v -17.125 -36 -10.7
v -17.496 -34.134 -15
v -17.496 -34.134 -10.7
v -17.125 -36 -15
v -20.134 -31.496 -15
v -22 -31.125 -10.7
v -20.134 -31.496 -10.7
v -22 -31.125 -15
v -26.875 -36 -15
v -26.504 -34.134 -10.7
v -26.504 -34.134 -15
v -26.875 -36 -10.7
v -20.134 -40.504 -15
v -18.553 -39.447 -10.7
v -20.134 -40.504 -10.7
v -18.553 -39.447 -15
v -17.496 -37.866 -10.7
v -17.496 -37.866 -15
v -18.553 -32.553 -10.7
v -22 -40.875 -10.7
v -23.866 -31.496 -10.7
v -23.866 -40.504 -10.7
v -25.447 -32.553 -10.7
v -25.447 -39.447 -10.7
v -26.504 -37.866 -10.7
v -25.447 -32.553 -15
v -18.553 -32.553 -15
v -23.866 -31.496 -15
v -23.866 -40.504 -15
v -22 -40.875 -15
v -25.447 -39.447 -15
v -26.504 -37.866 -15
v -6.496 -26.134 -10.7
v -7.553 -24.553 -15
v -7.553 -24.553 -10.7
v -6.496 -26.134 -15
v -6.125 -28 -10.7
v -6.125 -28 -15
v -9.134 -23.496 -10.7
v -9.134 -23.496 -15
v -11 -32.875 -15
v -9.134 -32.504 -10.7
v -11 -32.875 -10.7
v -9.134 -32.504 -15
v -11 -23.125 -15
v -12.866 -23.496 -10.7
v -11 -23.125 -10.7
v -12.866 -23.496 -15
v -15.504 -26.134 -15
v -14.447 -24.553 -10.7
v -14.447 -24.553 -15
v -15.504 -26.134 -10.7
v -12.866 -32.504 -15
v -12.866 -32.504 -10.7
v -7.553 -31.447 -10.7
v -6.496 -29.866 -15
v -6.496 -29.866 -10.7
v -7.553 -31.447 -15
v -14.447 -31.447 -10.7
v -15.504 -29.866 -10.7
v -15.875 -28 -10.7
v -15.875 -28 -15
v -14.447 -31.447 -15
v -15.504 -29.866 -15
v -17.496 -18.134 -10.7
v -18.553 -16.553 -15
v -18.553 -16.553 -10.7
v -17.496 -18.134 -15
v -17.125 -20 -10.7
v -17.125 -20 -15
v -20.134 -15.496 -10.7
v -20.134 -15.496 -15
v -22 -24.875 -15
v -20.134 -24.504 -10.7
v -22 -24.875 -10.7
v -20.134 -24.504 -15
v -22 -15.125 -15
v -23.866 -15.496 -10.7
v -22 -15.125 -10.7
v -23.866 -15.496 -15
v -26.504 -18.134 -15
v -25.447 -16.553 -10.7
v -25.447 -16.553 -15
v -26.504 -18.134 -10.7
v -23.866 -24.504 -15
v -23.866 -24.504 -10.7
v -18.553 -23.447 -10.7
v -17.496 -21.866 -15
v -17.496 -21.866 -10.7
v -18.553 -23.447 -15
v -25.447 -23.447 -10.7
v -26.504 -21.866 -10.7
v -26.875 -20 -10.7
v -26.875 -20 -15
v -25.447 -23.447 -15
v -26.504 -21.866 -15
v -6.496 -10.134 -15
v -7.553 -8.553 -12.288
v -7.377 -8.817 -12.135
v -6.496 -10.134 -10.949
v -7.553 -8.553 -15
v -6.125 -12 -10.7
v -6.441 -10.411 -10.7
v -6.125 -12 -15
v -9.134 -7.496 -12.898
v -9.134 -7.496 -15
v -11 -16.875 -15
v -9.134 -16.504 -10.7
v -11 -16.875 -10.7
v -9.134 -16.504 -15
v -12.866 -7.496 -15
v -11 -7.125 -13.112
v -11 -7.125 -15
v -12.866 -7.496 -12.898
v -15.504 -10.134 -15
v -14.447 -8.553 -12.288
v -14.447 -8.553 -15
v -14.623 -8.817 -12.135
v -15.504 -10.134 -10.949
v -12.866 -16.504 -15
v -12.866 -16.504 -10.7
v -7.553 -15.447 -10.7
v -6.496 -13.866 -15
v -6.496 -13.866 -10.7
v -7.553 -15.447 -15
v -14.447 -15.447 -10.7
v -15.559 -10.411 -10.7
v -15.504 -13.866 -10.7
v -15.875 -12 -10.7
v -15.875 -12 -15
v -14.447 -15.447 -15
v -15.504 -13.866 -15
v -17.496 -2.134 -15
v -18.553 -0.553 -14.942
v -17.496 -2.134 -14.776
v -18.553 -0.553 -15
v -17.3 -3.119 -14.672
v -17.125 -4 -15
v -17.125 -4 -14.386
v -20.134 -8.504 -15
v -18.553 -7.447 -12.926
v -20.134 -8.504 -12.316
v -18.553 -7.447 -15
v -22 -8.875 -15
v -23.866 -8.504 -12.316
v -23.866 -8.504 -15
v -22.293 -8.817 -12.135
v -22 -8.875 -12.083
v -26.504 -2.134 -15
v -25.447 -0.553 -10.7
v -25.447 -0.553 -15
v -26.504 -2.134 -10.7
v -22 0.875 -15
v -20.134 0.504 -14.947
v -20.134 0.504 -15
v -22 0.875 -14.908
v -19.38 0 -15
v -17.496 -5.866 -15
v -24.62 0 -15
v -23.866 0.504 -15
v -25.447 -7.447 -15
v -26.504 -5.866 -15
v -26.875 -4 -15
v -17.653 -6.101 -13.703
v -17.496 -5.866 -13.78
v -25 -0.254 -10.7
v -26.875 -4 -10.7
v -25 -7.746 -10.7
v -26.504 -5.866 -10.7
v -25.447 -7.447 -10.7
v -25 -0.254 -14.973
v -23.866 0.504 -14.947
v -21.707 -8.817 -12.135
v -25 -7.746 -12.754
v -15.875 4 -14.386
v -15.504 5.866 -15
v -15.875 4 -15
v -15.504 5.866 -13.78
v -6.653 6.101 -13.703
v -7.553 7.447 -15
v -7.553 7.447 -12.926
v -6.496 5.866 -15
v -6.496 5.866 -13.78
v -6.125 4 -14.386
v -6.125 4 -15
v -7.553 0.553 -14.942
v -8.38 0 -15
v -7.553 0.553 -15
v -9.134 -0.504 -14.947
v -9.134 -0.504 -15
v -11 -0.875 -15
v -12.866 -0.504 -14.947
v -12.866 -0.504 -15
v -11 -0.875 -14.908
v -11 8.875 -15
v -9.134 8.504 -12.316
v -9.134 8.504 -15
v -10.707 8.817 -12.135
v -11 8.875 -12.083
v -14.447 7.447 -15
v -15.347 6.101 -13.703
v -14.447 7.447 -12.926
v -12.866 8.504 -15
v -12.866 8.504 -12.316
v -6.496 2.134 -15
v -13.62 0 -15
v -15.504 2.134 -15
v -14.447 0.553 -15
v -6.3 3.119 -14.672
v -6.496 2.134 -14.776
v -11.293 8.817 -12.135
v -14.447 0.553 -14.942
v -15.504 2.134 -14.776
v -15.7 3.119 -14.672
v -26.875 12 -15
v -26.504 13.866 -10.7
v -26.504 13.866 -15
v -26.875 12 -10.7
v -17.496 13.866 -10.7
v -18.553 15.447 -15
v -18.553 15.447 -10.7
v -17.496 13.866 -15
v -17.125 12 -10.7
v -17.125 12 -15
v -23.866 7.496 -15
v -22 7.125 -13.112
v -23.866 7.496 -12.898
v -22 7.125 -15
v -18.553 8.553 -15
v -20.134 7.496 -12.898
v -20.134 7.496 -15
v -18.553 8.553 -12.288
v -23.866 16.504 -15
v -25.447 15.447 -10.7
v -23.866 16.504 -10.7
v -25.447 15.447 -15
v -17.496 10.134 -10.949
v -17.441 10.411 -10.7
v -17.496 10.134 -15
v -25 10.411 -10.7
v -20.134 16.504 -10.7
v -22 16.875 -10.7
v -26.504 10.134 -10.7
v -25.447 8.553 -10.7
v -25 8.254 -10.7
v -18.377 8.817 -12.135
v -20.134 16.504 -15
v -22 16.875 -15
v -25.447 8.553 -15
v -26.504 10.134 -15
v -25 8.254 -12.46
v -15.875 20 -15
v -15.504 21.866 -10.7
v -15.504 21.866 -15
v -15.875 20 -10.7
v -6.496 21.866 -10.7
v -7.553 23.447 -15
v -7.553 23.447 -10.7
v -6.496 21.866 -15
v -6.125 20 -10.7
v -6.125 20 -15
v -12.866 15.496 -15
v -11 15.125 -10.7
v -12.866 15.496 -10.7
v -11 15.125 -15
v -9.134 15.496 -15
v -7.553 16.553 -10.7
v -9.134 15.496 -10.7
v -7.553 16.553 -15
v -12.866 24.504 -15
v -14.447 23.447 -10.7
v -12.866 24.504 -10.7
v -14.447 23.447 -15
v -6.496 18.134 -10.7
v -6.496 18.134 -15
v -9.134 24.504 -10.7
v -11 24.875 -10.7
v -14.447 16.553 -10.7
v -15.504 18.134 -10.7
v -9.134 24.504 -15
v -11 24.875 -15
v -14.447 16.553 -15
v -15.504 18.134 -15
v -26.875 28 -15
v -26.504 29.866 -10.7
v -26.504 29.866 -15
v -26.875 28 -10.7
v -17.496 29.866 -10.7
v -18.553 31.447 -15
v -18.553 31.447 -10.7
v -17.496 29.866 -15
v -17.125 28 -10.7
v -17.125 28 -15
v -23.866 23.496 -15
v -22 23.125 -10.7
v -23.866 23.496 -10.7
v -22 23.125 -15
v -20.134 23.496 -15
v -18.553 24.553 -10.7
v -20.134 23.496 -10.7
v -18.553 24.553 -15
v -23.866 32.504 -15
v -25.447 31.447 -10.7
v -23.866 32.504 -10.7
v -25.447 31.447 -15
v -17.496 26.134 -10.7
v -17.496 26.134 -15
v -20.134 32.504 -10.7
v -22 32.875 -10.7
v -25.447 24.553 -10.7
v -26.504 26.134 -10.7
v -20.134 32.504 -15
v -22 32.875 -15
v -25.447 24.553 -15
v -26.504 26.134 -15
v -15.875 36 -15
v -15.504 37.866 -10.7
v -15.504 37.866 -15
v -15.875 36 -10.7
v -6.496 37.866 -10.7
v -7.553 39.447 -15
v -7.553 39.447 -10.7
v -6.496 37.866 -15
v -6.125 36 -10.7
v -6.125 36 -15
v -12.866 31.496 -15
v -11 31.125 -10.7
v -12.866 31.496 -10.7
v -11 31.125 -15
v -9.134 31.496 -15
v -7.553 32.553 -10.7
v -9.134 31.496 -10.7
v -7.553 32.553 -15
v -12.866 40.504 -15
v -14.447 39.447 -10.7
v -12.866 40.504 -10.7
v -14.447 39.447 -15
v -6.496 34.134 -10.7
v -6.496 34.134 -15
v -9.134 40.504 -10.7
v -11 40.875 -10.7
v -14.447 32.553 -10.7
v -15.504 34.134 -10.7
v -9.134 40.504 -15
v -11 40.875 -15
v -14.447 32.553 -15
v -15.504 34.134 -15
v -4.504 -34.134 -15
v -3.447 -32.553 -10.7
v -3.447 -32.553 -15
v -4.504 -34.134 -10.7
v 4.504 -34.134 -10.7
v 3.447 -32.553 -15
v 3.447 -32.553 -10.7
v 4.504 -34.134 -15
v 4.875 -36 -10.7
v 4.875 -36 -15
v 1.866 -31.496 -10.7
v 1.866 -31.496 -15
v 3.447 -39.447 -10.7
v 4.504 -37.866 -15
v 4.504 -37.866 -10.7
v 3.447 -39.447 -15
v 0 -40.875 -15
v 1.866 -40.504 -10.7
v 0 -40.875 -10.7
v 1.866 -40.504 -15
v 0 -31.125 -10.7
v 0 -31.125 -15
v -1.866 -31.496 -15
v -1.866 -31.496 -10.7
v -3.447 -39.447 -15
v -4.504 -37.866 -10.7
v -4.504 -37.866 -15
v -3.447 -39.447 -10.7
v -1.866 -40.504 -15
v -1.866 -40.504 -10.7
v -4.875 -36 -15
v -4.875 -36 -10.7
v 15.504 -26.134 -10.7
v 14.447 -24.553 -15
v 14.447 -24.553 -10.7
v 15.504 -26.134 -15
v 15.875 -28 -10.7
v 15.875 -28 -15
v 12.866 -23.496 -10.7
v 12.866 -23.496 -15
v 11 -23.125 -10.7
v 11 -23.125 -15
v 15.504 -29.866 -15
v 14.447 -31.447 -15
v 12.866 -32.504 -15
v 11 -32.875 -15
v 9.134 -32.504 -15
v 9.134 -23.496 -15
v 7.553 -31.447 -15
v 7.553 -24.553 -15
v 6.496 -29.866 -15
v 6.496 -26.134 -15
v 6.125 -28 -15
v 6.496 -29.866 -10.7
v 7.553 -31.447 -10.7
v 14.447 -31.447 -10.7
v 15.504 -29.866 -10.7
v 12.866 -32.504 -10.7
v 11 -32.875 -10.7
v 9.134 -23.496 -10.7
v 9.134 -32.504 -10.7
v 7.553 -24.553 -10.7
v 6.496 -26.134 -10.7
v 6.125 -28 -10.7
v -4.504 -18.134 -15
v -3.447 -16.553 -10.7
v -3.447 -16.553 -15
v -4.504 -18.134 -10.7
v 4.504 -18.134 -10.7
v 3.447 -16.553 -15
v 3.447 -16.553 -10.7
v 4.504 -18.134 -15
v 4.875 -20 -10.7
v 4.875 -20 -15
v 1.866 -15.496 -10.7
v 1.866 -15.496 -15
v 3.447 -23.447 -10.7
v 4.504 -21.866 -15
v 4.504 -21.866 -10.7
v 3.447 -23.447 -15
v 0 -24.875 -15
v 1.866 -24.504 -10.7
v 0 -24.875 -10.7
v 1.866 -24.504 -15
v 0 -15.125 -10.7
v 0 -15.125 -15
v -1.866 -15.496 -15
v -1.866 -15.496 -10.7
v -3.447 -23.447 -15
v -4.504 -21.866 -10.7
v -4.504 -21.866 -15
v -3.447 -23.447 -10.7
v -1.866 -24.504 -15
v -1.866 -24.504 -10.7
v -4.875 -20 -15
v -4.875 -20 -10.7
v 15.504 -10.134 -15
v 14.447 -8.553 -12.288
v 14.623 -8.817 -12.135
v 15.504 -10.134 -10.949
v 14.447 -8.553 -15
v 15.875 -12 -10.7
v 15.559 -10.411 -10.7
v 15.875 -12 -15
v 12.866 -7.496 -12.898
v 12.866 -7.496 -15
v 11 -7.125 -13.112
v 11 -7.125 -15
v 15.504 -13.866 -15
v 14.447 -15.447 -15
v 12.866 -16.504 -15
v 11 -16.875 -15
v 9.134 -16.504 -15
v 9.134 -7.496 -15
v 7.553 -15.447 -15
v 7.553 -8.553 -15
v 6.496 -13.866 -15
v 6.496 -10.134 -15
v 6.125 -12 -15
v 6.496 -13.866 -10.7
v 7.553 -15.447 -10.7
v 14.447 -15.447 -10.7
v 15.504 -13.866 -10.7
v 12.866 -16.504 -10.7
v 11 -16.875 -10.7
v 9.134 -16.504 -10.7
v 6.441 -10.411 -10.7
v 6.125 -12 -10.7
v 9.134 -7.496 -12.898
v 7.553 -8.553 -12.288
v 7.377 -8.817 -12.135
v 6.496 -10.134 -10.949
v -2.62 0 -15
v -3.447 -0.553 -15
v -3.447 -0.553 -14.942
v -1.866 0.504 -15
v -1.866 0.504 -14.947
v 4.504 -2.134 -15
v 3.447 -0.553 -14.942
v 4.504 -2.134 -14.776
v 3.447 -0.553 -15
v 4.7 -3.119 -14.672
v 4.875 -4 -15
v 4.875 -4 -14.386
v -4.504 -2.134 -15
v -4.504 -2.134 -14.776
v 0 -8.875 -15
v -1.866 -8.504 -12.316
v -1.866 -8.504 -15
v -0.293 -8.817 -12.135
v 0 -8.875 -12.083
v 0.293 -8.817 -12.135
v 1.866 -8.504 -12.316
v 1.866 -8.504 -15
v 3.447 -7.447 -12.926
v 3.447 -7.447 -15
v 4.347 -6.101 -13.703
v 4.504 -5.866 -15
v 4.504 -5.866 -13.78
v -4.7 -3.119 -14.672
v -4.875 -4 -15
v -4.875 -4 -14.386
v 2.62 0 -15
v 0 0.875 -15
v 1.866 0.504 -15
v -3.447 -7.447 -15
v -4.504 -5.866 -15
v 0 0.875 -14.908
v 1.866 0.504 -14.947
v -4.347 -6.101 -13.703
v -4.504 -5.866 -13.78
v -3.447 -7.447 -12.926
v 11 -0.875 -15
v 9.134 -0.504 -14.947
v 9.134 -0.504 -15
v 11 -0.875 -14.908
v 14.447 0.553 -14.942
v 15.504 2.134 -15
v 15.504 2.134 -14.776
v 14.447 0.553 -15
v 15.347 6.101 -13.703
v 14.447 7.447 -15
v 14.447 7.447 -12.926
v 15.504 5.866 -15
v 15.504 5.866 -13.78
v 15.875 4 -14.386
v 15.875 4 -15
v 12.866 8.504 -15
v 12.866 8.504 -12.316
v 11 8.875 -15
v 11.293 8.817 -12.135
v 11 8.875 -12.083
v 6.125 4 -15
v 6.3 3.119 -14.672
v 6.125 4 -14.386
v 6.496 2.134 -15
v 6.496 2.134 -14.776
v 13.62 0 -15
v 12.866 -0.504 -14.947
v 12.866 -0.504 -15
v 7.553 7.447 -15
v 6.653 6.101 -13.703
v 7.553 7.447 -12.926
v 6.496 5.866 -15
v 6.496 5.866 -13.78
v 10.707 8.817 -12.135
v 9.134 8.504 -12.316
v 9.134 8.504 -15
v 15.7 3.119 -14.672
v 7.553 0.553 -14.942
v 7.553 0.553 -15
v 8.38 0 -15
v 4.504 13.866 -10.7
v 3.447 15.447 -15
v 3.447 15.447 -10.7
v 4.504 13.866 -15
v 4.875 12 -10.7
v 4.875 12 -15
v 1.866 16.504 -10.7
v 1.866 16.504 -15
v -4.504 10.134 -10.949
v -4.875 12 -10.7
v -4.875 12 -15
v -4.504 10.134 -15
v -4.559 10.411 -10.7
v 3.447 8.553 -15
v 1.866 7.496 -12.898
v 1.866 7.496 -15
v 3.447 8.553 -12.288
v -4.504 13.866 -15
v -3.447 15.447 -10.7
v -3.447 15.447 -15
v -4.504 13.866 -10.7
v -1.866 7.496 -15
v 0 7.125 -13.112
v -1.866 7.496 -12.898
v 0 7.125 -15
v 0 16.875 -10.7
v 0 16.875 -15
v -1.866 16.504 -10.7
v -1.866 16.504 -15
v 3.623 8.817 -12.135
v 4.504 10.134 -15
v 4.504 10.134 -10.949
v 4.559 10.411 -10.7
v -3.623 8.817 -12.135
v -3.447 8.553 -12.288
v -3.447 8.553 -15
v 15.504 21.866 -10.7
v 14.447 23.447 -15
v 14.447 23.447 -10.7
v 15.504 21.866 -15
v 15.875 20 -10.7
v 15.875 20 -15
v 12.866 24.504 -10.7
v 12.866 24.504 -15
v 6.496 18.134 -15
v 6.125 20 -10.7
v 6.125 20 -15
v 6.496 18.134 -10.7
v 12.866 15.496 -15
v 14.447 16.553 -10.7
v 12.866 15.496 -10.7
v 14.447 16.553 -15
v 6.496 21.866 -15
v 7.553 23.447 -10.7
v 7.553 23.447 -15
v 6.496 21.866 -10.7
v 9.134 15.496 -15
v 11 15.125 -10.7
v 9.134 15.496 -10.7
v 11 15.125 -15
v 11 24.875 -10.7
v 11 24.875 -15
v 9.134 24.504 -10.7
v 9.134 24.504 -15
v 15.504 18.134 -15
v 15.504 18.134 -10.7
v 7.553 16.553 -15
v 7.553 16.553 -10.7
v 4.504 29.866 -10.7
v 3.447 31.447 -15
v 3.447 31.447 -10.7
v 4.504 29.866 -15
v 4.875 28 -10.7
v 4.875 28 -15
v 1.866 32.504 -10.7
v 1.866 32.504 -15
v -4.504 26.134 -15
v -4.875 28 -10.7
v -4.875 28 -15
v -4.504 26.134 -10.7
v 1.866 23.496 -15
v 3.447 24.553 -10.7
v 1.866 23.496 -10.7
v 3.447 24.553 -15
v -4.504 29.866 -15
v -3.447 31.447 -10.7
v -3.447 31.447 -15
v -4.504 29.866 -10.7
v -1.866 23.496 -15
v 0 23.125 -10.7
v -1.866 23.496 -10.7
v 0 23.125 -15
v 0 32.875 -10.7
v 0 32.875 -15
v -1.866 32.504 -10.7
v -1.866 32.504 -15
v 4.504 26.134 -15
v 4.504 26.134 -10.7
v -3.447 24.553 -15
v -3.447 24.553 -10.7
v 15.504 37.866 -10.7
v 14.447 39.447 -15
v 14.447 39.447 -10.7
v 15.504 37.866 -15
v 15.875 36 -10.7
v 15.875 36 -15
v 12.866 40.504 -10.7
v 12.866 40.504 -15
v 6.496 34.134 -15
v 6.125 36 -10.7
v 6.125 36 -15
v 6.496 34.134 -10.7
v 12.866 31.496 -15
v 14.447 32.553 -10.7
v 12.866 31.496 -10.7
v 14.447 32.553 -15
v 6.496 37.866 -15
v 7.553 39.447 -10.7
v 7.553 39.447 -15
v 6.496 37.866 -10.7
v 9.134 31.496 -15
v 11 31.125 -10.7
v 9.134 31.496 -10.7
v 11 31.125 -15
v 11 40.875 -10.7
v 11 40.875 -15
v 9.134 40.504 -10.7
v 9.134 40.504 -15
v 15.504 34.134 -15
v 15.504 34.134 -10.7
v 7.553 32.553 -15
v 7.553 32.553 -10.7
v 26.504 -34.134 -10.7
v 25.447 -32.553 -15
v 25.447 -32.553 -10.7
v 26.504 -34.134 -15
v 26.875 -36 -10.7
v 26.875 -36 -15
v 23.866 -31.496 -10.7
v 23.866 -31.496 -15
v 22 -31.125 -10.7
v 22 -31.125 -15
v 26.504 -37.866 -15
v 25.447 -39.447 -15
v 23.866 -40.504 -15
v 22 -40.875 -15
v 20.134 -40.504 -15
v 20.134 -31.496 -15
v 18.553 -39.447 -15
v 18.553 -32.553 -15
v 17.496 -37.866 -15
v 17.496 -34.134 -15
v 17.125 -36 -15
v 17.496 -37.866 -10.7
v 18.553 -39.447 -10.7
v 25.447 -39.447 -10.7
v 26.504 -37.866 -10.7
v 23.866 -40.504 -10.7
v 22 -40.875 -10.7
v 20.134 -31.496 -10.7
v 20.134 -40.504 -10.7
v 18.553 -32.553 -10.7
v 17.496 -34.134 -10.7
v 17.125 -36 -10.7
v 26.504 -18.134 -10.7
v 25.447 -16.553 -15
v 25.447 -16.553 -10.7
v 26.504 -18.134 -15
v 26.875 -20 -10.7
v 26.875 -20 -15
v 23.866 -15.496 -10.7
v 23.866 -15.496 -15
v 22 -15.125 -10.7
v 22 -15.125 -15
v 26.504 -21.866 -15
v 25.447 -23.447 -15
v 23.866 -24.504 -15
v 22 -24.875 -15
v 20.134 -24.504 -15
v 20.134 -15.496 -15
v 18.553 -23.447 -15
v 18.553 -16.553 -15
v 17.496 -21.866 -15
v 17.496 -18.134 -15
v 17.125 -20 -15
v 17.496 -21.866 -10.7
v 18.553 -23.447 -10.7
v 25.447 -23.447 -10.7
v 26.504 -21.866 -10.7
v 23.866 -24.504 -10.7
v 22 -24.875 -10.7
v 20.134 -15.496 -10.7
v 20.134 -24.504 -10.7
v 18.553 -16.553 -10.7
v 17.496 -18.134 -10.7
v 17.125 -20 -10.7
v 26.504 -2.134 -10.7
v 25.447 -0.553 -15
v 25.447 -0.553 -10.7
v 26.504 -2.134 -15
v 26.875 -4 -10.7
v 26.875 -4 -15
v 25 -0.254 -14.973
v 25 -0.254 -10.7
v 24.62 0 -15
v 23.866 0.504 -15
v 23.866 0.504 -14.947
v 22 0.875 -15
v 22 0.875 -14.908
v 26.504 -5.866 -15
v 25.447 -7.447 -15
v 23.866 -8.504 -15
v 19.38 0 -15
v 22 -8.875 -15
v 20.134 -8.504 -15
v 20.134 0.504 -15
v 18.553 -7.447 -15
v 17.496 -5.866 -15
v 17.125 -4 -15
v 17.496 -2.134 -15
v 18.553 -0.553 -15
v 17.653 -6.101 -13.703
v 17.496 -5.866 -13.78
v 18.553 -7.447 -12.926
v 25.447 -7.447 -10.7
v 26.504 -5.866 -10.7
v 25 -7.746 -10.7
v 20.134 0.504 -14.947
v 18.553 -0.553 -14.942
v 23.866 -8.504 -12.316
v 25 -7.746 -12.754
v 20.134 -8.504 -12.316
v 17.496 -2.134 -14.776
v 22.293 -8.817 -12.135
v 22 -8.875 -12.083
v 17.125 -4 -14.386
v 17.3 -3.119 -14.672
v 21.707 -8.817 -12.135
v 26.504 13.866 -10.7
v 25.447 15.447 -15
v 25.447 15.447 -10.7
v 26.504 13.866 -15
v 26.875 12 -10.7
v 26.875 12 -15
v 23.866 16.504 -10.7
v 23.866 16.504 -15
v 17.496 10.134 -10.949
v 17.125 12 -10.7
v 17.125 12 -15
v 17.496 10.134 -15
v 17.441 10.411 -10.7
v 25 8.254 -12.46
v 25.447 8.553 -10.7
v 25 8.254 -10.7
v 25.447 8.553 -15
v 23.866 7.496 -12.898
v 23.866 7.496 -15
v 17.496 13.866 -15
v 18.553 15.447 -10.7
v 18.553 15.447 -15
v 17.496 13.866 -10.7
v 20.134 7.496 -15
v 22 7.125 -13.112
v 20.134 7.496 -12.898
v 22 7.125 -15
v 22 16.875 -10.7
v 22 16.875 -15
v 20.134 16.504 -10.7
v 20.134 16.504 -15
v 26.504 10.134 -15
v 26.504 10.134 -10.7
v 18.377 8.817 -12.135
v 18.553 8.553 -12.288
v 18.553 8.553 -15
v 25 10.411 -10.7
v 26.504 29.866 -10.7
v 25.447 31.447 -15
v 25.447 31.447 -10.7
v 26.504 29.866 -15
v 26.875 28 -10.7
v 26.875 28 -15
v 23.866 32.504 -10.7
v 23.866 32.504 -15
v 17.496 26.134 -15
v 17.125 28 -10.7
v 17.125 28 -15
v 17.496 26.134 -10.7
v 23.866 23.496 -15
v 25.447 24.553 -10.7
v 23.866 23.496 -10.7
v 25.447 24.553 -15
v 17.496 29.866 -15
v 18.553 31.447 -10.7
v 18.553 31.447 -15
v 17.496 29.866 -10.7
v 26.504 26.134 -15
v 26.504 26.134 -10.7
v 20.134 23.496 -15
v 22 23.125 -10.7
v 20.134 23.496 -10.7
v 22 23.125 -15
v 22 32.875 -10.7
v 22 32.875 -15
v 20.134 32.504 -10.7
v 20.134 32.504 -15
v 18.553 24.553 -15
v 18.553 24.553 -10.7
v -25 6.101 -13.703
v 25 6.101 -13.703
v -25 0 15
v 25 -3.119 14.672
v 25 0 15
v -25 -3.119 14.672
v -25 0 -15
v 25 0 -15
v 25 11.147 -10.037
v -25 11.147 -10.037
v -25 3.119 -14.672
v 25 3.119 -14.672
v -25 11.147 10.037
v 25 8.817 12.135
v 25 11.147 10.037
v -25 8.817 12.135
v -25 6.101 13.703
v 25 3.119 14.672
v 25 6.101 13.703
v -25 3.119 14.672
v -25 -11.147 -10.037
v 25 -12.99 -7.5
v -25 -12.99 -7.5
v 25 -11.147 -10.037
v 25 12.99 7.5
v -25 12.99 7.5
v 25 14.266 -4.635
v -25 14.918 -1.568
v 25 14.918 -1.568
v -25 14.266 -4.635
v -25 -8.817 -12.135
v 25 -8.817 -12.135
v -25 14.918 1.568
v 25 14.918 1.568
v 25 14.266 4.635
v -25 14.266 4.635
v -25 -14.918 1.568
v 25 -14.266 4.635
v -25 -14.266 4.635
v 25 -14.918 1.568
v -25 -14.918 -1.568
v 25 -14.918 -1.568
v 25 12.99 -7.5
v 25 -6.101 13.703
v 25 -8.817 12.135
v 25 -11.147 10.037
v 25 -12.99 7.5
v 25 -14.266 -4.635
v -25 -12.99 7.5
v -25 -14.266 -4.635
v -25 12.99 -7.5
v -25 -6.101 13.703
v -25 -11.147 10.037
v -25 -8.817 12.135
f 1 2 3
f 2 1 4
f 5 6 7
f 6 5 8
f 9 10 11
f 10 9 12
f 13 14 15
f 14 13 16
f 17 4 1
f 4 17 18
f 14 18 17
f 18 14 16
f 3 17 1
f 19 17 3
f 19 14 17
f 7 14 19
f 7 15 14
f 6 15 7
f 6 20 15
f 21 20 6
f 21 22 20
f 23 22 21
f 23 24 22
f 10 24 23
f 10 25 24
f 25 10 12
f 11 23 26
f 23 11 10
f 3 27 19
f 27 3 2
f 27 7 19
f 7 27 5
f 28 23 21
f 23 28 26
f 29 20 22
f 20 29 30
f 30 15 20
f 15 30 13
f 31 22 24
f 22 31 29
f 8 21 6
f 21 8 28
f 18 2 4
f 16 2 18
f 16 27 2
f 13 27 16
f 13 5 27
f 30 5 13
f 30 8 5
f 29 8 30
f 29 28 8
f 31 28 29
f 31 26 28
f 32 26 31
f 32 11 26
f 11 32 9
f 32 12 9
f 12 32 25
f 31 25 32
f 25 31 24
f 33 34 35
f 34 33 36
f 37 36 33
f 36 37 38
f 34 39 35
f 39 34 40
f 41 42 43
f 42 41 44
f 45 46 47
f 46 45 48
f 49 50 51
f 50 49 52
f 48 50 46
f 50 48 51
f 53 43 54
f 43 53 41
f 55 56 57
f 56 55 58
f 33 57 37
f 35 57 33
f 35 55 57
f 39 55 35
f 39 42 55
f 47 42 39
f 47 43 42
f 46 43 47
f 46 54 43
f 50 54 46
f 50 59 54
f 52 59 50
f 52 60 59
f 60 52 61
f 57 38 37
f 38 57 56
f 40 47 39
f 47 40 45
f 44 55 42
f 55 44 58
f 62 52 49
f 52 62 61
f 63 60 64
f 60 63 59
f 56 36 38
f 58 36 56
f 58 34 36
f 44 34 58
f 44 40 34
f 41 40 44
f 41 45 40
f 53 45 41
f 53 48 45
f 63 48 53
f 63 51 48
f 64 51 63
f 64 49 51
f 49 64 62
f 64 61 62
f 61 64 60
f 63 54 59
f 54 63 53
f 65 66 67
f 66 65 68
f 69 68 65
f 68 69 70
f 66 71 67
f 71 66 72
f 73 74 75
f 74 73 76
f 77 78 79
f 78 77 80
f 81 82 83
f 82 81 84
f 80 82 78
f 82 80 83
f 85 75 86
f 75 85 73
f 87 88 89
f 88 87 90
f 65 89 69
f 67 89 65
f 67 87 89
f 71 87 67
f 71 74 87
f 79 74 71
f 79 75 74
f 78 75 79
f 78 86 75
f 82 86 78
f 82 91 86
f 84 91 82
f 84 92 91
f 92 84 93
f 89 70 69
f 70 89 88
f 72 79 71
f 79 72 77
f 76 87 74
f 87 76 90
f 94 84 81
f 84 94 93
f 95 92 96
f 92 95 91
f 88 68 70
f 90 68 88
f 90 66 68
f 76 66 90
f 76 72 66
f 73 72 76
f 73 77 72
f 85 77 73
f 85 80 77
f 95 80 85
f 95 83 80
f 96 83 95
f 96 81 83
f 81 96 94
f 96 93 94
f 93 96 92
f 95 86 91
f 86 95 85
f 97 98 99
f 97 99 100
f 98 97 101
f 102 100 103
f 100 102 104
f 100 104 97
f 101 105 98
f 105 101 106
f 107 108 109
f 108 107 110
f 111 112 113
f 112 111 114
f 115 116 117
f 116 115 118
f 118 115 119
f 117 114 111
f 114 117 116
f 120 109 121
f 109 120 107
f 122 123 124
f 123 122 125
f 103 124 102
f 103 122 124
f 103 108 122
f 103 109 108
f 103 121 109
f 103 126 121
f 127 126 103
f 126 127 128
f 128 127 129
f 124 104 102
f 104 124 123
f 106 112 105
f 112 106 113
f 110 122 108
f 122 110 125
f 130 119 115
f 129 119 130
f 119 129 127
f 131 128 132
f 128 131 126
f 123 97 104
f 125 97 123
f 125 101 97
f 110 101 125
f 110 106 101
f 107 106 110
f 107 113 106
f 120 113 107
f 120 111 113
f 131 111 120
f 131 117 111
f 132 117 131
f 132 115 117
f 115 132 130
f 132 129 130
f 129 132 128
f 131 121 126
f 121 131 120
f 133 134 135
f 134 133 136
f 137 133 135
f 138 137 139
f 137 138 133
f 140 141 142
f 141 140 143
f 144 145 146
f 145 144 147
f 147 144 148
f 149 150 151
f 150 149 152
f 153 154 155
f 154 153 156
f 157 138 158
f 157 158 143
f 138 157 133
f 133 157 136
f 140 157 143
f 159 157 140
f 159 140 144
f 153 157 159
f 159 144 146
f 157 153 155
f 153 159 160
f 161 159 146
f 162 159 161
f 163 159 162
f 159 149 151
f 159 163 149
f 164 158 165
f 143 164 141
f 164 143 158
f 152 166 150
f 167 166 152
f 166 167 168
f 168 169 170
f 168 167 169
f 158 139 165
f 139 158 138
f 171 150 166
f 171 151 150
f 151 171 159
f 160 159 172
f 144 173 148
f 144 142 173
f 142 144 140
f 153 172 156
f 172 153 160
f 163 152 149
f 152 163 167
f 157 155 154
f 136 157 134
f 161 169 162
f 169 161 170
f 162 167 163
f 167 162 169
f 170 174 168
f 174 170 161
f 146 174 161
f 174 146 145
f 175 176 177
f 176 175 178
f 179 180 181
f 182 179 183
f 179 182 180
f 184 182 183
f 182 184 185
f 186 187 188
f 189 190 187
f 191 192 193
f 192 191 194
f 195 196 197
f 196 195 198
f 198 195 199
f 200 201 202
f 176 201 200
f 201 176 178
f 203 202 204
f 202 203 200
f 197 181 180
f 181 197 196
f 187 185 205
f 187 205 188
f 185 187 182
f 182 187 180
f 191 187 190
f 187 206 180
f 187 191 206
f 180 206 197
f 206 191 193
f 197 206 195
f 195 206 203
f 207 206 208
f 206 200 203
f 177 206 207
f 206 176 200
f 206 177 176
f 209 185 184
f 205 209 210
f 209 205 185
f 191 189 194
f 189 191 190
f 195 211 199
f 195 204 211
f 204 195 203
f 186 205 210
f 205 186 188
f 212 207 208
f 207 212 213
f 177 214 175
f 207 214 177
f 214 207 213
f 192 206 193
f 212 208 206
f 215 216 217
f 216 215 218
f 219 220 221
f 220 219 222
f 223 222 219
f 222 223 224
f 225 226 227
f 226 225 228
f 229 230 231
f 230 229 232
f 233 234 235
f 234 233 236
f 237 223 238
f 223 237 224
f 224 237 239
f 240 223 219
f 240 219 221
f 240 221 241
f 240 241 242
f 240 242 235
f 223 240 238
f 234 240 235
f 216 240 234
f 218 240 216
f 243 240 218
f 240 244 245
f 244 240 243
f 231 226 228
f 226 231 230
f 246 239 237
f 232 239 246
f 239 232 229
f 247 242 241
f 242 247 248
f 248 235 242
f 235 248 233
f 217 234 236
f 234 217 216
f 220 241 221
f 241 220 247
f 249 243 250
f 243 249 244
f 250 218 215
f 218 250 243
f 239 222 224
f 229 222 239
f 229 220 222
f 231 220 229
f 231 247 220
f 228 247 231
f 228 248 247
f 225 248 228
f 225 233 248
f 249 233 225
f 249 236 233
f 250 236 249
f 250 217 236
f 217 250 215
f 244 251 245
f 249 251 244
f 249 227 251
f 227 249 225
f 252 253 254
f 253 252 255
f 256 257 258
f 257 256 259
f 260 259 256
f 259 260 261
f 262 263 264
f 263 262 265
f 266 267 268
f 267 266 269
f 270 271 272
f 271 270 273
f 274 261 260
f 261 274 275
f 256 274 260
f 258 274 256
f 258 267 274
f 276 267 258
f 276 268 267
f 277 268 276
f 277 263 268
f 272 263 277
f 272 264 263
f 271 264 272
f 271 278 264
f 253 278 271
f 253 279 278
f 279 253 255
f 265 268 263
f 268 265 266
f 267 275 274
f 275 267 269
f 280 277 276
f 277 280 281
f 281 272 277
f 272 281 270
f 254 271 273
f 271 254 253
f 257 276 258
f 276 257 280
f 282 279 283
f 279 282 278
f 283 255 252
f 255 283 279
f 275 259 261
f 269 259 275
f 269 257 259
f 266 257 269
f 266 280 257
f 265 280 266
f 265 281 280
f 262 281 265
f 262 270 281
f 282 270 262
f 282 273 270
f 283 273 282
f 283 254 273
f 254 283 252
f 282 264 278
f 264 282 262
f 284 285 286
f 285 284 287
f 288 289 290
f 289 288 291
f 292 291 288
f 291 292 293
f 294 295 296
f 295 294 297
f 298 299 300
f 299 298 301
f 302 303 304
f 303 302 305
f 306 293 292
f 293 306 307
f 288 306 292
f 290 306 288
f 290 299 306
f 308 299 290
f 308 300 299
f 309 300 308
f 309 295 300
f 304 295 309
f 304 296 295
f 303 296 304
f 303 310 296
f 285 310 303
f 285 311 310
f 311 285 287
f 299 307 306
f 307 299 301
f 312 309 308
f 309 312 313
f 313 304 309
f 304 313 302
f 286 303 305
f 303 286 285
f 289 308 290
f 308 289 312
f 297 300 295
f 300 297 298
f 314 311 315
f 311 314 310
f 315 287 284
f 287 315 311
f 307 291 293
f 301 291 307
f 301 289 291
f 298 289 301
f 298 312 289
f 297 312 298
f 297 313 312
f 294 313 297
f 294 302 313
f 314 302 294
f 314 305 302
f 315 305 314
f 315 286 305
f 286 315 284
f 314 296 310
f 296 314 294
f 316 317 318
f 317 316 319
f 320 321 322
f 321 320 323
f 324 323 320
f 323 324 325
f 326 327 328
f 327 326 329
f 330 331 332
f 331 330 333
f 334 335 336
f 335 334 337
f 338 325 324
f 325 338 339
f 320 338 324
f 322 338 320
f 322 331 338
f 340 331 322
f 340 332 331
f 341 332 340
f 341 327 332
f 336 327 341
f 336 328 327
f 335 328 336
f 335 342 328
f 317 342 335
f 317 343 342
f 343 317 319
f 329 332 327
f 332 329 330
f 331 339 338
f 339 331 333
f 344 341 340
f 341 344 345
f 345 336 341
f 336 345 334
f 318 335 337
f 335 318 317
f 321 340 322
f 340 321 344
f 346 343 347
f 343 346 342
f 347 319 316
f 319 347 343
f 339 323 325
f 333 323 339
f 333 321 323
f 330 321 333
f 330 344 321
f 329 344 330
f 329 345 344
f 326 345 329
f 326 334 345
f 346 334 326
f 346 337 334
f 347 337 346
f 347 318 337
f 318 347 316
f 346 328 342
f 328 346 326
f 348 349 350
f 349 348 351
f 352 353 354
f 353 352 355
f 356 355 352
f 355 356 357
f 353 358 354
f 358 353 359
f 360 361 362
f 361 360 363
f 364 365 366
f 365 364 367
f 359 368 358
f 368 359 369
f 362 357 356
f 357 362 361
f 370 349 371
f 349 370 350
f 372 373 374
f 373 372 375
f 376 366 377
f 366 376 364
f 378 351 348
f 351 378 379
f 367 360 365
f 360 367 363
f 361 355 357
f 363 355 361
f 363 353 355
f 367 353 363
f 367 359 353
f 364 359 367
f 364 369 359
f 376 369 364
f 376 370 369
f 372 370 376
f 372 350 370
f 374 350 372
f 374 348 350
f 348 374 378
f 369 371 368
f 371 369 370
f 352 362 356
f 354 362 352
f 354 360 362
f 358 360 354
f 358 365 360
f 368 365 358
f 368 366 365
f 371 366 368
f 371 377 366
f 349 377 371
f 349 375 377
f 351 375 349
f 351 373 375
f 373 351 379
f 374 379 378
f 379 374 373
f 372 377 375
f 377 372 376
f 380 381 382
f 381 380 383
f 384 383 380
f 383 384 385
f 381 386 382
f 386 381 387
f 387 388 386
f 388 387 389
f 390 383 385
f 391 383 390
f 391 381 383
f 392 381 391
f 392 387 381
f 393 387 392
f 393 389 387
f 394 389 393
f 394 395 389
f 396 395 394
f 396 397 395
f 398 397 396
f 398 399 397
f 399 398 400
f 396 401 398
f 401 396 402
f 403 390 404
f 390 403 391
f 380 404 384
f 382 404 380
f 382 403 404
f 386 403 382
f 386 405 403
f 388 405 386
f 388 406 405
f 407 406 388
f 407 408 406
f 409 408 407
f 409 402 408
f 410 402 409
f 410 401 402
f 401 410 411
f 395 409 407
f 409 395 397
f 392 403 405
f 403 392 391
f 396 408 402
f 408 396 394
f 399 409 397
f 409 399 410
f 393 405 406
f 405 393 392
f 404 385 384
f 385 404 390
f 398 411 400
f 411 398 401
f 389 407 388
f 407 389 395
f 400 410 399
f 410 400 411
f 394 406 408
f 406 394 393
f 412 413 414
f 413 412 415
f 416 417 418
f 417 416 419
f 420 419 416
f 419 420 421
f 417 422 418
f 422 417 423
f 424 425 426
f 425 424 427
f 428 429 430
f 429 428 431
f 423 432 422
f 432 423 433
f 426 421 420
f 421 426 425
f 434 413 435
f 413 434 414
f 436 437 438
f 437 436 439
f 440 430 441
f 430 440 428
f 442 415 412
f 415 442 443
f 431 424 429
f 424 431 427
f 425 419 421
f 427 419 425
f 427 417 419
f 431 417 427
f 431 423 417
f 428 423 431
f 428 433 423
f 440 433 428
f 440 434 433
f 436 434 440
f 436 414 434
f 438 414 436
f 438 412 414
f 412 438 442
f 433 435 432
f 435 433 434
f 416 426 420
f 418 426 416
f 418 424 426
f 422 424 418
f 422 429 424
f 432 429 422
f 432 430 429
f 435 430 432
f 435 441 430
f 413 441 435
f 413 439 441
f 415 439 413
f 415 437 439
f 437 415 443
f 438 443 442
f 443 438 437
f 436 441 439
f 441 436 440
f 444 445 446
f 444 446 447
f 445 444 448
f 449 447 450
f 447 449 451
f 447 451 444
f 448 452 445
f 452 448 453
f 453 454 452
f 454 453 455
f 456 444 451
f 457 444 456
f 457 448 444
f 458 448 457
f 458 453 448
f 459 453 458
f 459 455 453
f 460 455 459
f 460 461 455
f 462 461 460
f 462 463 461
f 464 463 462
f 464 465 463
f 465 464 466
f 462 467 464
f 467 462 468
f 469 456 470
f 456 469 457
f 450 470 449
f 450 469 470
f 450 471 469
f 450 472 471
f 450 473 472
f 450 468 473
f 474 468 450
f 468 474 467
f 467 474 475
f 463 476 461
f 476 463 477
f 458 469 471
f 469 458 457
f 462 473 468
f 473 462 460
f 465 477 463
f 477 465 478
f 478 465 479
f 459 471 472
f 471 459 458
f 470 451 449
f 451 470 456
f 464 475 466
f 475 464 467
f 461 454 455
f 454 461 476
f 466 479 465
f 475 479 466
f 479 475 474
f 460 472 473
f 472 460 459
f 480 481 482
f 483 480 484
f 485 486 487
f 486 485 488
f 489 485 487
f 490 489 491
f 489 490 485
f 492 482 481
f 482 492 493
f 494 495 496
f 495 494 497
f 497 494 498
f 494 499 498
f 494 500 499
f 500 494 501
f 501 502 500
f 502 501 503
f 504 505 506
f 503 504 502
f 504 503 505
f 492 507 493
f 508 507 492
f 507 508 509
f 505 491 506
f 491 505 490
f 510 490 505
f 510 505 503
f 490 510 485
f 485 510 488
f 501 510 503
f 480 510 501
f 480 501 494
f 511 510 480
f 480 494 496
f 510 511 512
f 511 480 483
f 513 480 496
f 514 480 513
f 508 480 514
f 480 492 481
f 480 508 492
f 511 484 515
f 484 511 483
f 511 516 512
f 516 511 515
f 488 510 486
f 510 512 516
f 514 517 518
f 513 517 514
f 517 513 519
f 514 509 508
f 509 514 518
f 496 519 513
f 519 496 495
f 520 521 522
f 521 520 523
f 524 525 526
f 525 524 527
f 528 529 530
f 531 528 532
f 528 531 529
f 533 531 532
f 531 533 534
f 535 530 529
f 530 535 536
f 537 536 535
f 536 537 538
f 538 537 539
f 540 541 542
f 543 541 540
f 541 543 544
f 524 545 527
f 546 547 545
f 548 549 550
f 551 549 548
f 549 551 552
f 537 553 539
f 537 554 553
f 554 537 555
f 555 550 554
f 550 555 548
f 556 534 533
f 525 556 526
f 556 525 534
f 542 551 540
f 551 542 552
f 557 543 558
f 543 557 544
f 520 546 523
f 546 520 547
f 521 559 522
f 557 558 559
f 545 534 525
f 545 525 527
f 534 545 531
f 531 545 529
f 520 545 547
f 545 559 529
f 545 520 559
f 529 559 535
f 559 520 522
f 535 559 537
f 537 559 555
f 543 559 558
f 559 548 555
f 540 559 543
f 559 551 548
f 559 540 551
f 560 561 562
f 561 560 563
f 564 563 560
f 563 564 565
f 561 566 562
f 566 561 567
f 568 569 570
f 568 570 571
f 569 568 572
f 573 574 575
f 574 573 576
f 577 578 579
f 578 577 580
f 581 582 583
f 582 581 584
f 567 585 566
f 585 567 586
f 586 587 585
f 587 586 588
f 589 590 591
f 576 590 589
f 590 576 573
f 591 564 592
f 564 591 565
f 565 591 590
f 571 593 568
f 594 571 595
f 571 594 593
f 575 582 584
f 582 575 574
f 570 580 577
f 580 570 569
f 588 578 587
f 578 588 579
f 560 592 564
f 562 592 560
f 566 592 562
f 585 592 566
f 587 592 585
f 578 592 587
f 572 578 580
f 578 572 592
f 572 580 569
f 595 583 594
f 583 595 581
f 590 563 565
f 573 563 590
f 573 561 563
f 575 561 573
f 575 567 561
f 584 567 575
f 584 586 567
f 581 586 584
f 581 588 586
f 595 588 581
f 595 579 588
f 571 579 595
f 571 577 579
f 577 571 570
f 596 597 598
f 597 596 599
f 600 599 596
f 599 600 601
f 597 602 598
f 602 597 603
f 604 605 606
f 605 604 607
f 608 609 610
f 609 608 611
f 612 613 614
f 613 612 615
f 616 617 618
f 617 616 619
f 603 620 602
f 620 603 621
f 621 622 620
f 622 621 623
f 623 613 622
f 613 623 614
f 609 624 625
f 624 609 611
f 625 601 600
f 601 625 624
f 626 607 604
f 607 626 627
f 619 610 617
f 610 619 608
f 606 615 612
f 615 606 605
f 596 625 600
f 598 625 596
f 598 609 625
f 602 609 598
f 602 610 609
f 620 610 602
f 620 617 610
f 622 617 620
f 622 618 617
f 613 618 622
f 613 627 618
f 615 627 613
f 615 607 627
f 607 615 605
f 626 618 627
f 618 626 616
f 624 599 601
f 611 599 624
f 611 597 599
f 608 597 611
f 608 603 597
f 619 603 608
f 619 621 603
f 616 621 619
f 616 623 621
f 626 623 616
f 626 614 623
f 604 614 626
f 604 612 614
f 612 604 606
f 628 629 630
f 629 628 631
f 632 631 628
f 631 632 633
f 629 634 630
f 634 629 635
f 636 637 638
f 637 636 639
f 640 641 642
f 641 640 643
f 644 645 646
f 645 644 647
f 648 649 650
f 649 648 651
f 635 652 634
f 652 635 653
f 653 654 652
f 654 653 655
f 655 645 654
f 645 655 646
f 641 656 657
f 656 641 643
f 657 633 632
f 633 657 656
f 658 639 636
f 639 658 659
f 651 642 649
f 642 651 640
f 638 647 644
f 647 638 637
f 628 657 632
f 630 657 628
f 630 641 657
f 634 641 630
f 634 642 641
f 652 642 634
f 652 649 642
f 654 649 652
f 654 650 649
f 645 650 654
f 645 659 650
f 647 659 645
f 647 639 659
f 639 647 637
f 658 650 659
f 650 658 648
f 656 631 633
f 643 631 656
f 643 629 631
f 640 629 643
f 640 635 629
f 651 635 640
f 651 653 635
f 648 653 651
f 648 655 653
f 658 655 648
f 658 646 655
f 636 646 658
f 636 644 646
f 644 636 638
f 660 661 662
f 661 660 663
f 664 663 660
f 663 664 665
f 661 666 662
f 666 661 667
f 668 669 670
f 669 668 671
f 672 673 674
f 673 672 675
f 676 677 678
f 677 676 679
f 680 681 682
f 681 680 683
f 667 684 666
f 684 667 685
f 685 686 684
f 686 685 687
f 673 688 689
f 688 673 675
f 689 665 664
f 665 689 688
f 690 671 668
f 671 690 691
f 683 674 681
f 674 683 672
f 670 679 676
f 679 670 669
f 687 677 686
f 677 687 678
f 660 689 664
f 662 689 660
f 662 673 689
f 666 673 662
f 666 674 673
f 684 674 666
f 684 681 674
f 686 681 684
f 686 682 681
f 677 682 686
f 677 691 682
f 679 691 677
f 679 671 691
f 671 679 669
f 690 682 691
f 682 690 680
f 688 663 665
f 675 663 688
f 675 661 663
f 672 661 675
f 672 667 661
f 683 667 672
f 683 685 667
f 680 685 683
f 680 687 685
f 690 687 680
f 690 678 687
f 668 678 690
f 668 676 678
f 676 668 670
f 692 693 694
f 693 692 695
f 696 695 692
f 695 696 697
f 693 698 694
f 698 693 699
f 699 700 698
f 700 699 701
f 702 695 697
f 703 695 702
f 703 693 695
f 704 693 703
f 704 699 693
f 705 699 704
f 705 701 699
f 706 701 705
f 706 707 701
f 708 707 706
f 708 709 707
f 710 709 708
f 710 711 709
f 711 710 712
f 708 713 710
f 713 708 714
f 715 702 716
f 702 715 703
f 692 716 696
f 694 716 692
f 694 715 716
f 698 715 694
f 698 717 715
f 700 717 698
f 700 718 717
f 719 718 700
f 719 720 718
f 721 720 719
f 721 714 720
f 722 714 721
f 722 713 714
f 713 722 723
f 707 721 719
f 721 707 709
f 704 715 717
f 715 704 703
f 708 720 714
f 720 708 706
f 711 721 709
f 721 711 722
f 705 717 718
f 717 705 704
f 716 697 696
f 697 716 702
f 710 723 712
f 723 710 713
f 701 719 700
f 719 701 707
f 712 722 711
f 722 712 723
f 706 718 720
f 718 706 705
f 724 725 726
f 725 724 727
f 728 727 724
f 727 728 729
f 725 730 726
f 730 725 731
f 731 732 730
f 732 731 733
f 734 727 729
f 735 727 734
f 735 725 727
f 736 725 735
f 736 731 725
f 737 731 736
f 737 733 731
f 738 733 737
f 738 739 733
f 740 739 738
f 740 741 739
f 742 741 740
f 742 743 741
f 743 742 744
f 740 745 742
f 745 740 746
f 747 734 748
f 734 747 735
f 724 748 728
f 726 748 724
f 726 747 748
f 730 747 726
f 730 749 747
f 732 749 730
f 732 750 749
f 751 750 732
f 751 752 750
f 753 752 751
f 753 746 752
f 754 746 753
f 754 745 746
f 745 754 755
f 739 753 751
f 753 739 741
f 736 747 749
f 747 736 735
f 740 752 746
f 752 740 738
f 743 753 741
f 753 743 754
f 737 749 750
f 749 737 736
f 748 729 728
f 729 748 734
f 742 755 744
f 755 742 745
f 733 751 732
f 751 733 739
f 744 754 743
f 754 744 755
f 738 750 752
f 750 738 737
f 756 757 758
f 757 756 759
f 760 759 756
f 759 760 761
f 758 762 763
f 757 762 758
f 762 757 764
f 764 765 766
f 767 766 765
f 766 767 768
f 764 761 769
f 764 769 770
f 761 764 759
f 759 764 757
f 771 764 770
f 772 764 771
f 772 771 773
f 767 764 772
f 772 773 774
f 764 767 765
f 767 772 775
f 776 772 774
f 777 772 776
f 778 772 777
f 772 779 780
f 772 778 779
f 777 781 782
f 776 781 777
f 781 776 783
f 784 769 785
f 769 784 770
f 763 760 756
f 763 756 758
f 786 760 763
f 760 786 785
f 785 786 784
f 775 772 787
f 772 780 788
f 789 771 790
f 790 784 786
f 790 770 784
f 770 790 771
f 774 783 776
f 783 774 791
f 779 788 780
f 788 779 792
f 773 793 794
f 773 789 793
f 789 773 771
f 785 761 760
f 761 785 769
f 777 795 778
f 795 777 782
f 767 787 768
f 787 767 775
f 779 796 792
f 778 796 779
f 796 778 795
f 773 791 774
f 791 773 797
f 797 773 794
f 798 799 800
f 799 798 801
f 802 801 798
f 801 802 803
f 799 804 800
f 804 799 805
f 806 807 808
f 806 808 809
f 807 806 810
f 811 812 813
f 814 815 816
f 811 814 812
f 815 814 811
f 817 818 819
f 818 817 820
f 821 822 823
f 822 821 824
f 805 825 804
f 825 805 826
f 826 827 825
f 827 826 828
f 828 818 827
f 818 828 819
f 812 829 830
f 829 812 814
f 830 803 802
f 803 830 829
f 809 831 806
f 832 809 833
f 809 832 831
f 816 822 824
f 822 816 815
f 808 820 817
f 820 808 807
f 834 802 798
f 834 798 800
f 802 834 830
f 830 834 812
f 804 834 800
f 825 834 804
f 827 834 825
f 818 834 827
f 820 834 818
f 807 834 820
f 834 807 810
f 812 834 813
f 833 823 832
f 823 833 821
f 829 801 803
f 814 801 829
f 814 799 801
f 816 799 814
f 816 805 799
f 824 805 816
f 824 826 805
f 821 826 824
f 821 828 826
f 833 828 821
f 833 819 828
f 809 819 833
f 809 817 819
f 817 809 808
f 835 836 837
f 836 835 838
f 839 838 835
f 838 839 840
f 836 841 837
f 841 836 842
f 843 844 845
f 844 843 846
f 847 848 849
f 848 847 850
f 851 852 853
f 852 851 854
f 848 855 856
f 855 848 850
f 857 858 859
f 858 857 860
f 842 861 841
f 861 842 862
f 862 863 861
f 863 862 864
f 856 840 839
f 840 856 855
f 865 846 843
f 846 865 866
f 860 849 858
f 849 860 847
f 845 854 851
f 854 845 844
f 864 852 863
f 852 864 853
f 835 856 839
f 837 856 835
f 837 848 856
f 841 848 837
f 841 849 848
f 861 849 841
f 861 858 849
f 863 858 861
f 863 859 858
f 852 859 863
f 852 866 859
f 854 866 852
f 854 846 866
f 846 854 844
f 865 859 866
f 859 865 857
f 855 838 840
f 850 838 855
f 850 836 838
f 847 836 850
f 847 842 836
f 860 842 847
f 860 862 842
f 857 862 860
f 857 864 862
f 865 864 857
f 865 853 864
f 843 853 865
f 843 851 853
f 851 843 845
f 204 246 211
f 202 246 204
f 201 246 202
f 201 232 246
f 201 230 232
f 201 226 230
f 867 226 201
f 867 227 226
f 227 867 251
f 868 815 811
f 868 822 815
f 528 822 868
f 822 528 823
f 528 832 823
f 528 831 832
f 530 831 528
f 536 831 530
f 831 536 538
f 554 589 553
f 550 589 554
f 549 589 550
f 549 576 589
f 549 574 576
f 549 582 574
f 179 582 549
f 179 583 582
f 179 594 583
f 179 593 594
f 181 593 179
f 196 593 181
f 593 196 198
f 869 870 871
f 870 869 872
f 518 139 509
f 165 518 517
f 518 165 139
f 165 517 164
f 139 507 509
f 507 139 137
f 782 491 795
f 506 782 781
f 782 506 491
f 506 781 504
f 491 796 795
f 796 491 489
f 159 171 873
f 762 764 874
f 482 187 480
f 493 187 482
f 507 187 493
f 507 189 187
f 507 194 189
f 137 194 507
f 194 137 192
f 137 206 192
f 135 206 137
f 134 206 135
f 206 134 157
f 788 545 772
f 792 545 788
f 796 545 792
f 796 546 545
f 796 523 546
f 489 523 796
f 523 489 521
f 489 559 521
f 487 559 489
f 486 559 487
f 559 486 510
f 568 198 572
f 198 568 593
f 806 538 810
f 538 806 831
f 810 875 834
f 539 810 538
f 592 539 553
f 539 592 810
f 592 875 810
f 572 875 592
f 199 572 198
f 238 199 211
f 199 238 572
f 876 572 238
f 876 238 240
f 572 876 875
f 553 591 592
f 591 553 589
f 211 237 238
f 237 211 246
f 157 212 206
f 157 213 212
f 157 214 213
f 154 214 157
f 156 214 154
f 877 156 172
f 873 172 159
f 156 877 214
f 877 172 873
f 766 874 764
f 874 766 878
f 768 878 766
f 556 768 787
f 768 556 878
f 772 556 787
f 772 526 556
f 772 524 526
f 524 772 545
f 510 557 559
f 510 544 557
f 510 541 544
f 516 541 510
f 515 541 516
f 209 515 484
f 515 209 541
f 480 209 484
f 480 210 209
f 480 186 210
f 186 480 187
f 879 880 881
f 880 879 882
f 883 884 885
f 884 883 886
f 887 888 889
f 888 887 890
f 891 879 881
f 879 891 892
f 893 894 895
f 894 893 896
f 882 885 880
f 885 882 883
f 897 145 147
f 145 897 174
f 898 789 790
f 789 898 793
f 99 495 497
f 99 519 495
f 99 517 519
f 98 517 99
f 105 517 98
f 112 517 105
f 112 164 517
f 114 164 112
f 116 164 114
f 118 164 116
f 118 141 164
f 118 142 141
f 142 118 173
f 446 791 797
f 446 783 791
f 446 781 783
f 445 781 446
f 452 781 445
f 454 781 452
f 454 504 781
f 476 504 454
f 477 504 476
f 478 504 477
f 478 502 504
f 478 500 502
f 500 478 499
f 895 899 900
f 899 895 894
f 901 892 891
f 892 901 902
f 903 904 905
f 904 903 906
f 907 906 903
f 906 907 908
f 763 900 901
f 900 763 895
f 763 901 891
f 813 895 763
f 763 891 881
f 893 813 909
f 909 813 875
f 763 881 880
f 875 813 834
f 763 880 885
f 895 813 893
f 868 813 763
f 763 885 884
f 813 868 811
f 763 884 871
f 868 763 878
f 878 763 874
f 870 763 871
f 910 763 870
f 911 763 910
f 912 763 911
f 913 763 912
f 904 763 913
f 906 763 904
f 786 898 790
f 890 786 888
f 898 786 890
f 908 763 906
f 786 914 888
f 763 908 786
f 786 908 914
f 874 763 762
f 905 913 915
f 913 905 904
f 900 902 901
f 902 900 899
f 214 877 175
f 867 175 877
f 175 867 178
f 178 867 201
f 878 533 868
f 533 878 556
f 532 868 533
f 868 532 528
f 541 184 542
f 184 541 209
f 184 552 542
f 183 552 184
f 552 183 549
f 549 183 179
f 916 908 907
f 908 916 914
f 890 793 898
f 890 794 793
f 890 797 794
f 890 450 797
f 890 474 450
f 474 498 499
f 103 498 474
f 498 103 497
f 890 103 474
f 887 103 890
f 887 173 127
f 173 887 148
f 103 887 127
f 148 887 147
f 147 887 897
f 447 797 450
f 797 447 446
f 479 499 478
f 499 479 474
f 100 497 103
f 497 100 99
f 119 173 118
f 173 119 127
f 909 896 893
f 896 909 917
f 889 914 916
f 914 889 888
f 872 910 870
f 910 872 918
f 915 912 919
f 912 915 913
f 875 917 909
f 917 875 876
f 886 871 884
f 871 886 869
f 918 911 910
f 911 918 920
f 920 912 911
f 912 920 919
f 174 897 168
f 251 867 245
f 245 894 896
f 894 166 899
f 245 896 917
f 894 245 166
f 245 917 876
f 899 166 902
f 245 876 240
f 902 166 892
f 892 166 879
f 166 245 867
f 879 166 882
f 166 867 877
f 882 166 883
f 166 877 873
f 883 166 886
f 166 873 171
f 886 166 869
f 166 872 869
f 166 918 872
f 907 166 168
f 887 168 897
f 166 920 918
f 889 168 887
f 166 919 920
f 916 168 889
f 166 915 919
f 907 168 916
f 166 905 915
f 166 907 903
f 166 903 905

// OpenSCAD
/* [Dimensions] */
drumDia=30;

/* [Blister] */
blstrRows=10;
blstrCols=5;
blstrStagger=true;
blstrPcktDist=[11,8];



//drum
rotate([0,90,0]) cylinder(d=drumDia,h=50,center=true);

//blister
translate([0,0,-drumDia/2]) blister();

module blister(){

  for (ix=[-(blstrCols-1)/4:(blstrCols-1)/4],iy=[-(blstrRows-1)/4:(blstrRows-1)/4]){
    
    translate([ix*blstrPcktDist.x*2,iy*blstrPcktDist.y*2,0]) pocket();
    if (ix<(blstrCols-1)/4) translate([ix*(blstrPcktDist.x*2)+blstrPcktDist.x,iy*(blstrPcktDist.y*2)+blstrPcktDist.y,0]) pocket();
    }

  module pocket(){
    
    //round
    cylinder(d=9.75,h=4.3);
  }
}
